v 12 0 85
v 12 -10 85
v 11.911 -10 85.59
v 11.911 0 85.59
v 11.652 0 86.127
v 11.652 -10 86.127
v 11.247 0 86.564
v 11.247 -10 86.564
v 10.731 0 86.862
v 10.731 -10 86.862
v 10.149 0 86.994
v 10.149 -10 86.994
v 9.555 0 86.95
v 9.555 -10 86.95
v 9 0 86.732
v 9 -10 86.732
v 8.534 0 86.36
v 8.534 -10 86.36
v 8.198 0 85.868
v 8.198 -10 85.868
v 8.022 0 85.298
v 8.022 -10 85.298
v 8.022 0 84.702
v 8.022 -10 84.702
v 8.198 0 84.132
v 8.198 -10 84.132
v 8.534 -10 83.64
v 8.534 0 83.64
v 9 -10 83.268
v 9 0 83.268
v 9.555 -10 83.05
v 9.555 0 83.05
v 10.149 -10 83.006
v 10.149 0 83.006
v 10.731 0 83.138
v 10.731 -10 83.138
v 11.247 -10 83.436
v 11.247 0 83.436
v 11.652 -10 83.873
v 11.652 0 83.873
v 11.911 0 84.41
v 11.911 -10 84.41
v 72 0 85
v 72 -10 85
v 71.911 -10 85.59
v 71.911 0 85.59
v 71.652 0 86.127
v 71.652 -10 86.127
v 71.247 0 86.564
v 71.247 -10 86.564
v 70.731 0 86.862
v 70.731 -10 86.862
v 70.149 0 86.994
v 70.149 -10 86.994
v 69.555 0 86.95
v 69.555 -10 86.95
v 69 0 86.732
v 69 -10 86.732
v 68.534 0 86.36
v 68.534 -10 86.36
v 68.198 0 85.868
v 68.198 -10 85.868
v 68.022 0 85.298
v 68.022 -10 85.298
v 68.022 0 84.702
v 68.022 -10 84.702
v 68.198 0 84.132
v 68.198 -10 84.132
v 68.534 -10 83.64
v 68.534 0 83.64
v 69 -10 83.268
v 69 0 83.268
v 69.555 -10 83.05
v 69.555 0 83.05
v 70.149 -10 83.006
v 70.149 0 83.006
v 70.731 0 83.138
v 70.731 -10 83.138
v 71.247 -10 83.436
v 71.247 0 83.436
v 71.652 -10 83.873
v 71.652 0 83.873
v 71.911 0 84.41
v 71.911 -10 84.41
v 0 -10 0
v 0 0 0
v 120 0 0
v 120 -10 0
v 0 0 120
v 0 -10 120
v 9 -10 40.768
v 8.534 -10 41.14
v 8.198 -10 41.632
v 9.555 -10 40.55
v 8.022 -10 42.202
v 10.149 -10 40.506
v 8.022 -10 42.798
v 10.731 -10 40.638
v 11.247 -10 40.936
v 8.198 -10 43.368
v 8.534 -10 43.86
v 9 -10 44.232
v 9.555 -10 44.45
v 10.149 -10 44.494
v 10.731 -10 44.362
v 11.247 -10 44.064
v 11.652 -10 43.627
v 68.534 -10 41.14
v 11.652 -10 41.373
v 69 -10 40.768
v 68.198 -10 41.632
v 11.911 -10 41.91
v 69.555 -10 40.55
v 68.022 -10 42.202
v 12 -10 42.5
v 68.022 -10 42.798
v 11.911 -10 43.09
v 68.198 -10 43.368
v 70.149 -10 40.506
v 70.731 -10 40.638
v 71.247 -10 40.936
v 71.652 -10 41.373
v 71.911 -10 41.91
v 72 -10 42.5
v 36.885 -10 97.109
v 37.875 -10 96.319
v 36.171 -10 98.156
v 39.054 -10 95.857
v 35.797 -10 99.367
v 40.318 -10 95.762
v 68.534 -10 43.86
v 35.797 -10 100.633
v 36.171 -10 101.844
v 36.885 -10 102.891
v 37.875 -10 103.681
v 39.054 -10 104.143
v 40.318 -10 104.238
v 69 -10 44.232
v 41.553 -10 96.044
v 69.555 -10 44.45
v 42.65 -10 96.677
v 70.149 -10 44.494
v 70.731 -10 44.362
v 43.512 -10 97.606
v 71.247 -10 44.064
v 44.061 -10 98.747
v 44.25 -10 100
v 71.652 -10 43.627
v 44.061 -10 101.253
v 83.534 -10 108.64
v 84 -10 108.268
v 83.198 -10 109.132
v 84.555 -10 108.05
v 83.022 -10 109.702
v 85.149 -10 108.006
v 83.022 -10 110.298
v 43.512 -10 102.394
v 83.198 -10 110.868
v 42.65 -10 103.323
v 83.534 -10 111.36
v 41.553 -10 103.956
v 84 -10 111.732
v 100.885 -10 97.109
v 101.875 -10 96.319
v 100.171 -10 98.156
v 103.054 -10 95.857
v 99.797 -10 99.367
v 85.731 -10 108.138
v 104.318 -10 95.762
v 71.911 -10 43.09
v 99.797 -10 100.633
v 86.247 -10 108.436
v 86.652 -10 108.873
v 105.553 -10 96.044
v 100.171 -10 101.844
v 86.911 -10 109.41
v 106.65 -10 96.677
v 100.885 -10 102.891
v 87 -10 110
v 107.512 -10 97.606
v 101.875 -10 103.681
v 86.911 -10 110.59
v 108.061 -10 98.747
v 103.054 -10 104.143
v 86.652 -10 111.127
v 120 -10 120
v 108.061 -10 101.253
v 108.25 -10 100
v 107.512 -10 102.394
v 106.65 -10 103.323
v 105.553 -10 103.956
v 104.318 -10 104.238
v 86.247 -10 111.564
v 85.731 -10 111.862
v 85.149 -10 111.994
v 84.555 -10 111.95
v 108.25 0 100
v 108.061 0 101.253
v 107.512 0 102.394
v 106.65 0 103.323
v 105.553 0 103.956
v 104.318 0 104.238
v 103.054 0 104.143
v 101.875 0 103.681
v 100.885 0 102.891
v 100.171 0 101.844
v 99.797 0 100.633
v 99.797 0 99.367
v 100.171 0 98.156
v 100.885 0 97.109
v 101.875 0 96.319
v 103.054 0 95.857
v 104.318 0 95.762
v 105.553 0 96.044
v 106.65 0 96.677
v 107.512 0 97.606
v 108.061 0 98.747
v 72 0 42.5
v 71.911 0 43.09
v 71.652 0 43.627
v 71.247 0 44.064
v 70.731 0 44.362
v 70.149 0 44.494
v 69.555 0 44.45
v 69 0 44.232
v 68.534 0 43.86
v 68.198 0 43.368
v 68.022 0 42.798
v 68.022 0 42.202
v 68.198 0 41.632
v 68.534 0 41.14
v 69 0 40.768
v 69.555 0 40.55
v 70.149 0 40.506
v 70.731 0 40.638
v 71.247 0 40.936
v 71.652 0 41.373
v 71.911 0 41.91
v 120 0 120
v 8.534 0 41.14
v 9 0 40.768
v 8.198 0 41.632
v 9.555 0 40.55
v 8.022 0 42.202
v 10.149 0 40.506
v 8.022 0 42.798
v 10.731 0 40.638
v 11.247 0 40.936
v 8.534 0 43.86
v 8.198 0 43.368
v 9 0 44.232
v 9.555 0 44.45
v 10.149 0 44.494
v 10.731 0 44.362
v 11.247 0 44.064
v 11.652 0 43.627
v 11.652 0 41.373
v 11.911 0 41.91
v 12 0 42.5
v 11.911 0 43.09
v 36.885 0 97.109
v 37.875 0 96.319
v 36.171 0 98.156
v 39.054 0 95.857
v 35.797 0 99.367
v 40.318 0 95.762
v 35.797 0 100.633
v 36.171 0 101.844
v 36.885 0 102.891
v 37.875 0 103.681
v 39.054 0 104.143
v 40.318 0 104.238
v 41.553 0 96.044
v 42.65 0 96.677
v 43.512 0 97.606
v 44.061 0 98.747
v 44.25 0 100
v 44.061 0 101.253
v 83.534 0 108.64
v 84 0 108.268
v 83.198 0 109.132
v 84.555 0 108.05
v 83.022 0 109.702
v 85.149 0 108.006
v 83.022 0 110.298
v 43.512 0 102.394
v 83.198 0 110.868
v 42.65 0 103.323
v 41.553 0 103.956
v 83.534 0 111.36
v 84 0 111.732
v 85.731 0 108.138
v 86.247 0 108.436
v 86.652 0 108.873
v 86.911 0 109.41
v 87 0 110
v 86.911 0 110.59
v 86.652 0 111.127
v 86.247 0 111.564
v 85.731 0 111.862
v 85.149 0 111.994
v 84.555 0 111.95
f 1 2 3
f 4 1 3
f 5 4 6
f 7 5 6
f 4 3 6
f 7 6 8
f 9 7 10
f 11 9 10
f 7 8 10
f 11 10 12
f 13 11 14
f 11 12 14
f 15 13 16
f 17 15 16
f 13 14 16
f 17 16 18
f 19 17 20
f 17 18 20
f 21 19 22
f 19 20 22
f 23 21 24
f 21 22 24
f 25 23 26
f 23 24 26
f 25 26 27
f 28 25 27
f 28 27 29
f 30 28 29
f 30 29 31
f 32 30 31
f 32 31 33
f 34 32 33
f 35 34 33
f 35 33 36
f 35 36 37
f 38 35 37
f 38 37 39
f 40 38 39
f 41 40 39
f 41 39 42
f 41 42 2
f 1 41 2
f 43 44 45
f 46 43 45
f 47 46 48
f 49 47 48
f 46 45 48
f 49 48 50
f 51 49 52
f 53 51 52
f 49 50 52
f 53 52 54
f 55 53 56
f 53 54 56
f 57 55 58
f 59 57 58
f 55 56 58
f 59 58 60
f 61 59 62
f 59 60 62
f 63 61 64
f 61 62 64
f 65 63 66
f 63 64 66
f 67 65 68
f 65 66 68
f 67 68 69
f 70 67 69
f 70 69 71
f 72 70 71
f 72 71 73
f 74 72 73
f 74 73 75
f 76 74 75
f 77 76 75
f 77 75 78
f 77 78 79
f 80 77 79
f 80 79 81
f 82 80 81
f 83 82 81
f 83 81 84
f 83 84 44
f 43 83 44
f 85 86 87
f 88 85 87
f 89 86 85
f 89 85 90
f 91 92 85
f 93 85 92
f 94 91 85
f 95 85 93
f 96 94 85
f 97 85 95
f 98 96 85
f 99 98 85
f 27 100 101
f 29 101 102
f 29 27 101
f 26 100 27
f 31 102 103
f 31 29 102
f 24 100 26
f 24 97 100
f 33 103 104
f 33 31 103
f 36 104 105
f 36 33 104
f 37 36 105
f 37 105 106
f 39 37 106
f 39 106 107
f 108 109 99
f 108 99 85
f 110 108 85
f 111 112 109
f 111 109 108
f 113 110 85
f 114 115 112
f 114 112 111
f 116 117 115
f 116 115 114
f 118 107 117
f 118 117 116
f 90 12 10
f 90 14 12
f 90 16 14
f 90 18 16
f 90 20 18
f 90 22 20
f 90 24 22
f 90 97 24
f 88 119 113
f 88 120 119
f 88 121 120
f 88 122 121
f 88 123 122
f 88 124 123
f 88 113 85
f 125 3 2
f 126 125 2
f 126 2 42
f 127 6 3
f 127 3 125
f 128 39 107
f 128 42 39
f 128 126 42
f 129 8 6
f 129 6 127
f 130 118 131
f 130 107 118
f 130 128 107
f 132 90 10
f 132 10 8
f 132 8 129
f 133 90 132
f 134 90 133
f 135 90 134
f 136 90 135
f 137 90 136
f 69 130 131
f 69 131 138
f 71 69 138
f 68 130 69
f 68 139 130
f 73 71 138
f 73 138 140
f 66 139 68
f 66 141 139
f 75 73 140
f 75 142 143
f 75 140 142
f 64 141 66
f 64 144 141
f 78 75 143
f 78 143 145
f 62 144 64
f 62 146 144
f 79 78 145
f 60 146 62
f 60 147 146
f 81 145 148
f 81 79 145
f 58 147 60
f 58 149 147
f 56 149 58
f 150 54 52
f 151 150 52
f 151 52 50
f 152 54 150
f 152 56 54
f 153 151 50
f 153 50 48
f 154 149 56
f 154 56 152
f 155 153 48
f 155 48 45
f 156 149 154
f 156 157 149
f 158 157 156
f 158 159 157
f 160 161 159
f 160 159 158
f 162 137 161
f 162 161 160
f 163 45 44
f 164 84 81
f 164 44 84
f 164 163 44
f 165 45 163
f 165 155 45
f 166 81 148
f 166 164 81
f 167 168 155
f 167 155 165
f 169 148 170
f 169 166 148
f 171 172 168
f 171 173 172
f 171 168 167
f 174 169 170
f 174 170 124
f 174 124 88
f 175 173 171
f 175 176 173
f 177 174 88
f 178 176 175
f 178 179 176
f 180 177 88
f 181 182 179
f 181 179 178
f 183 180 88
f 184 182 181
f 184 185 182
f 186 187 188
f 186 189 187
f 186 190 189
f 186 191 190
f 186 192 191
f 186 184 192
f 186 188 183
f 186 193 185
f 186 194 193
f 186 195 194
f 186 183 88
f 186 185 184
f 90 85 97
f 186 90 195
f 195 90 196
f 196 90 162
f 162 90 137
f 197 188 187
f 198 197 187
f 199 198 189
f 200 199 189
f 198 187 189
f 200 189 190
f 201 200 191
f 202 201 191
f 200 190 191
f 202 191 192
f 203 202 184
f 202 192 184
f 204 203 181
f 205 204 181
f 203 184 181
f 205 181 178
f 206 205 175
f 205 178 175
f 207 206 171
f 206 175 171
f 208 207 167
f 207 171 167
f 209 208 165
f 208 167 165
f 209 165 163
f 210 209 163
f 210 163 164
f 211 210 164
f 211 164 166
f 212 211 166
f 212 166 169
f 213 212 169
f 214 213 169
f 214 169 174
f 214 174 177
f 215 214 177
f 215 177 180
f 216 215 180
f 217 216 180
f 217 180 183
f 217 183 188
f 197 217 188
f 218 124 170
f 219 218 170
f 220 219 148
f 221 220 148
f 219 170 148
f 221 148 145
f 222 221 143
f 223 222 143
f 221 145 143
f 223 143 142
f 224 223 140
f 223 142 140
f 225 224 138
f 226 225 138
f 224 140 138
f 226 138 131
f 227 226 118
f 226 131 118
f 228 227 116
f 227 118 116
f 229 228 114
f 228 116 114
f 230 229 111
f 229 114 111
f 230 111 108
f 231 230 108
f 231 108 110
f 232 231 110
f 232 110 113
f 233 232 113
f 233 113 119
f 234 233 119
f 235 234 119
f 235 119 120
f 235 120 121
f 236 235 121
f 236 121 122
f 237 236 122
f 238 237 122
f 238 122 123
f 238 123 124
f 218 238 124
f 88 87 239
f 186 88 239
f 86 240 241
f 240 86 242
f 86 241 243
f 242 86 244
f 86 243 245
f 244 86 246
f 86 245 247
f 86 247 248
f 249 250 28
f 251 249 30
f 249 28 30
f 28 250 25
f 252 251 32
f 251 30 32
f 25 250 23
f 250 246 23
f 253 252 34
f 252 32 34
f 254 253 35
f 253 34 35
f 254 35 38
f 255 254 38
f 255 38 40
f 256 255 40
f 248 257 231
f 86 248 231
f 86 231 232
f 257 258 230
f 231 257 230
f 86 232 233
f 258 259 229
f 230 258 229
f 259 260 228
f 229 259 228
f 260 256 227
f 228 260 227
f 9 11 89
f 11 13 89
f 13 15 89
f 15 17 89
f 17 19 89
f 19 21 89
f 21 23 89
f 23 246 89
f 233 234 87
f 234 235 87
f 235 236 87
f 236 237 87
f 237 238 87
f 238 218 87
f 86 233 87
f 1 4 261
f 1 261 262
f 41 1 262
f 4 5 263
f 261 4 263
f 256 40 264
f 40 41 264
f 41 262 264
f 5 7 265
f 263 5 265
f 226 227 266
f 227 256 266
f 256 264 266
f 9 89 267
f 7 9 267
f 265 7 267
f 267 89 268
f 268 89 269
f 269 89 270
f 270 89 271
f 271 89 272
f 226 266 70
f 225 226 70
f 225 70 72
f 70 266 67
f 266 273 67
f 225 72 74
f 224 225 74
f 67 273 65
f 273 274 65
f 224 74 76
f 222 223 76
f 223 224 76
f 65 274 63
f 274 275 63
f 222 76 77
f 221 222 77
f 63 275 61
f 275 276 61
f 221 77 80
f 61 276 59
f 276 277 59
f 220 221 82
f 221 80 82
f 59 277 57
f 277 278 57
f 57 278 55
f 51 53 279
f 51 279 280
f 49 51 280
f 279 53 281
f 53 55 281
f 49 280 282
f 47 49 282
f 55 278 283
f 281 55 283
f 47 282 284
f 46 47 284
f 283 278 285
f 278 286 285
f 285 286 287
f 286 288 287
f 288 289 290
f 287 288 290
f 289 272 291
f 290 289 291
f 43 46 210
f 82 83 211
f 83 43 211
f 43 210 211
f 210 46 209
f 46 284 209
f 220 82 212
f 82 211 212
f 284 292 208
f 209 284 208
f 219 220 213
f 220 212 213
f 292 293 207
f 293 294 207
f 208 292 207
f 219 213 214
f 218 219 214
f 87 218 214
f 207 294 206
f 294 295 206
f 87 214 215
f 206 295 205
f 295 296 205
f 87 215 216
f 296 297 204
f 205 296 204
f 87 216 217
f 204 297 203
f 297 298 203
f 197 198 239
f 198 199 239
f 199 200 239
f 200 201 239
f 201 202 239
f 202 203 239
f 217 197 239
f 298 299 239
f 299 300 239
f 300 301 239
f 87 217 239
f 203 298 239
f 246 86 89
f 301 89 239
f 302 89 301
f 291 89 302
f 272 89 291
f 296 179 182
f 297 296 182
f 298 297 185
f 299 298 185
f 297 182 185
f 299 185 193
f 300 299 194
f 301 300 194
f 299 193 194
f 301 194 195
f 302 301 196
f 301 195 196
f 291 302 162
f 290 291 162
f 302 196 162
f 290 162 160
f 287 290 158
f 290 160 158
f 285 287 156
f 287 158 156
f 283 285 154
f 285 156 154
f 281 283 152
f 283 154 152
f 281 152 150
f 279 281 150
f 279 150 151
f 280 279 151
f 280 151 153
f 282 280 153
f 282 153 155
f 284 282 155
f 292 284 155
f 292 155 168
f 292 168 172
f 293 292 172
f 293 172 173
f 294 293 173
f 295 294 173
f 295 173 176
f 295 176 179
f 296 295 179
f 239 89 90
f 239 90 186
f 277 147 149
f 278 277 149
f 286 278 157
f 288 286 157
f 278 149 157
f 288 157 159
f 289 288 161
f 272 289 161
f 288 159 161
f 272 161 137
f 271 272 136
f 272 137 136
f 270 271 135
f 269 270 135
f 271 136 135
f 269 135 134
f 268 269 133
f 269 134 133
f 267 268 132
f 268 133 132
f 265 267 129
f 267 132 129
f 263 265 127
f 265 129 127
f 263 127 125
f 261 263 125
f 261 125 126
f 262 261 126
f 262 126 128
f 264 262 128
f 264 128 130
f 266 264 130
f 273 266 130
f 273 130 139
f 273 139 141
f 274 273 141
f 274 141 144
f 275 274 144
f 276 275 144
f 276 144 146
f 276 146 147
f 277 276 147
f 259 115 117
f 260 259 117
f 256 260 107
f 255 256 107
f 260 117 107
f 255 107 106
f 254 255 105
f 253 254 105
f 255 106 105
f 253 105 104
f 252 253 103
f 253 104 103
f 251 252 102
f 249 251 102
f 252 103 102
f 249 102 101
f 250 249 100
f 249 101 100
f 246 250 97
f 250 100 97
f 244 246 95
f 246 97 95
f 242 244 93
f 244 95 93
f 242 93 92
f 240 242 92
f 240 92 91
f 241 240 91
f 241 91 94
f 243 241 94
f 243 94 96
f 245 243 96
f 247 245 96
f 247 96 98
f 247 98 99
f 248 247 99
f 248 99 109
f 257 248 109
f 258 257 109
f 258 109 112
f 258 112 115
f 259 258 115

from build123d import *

# Parameters (mm, degrees)
F0_W     = 120
F0_H     = 120
F1_DEPTH = 10
F2_R     = 4.25
F2_R_2   = 2
F3_DEPTH = 10.001
F4_R     = 2
F5_DEPTH = 10.001


with BuildPart() as f1:
    # F0 (on Front) → F1 (new body)
    with BuildSketch(Plane.XZ):
        with Locations((60, 60)):
            Rectangle(F0_W, F0_H)
    extrude(amount=F1_DEPTH)

    # F2 (on face) → F3 (cut, through all)
    with BuildSketch(Plane.XZ.offset(10)):
        with Locations((40, 100)):
            Circle(F2_R)
        with Locations((104, 100)):
            Circle(F2_R)
        with Locations((85, 110)):
            Circle(F2_R_2)
    extrude(amount=-F3_DEPTH, mode=Mode.SUBTRACT)

    # F4 (on face) → F5 (cut, through all)
    with BuildSketch(Plane.XZ.offset(10)):
        with Locations((10, 42.5)):
            Circle(F4_R)
        with Locations((10, 85)):
            Circle(F4_R)
        with Locations((70, 85)):
            Circle(F4_R)
        with Locations((70, 42.5)):
            Circle(F4_R)
    extrude(amount=-F5_DEPTH, mode=Mode.SUBTRACT)


solid = f1.part
